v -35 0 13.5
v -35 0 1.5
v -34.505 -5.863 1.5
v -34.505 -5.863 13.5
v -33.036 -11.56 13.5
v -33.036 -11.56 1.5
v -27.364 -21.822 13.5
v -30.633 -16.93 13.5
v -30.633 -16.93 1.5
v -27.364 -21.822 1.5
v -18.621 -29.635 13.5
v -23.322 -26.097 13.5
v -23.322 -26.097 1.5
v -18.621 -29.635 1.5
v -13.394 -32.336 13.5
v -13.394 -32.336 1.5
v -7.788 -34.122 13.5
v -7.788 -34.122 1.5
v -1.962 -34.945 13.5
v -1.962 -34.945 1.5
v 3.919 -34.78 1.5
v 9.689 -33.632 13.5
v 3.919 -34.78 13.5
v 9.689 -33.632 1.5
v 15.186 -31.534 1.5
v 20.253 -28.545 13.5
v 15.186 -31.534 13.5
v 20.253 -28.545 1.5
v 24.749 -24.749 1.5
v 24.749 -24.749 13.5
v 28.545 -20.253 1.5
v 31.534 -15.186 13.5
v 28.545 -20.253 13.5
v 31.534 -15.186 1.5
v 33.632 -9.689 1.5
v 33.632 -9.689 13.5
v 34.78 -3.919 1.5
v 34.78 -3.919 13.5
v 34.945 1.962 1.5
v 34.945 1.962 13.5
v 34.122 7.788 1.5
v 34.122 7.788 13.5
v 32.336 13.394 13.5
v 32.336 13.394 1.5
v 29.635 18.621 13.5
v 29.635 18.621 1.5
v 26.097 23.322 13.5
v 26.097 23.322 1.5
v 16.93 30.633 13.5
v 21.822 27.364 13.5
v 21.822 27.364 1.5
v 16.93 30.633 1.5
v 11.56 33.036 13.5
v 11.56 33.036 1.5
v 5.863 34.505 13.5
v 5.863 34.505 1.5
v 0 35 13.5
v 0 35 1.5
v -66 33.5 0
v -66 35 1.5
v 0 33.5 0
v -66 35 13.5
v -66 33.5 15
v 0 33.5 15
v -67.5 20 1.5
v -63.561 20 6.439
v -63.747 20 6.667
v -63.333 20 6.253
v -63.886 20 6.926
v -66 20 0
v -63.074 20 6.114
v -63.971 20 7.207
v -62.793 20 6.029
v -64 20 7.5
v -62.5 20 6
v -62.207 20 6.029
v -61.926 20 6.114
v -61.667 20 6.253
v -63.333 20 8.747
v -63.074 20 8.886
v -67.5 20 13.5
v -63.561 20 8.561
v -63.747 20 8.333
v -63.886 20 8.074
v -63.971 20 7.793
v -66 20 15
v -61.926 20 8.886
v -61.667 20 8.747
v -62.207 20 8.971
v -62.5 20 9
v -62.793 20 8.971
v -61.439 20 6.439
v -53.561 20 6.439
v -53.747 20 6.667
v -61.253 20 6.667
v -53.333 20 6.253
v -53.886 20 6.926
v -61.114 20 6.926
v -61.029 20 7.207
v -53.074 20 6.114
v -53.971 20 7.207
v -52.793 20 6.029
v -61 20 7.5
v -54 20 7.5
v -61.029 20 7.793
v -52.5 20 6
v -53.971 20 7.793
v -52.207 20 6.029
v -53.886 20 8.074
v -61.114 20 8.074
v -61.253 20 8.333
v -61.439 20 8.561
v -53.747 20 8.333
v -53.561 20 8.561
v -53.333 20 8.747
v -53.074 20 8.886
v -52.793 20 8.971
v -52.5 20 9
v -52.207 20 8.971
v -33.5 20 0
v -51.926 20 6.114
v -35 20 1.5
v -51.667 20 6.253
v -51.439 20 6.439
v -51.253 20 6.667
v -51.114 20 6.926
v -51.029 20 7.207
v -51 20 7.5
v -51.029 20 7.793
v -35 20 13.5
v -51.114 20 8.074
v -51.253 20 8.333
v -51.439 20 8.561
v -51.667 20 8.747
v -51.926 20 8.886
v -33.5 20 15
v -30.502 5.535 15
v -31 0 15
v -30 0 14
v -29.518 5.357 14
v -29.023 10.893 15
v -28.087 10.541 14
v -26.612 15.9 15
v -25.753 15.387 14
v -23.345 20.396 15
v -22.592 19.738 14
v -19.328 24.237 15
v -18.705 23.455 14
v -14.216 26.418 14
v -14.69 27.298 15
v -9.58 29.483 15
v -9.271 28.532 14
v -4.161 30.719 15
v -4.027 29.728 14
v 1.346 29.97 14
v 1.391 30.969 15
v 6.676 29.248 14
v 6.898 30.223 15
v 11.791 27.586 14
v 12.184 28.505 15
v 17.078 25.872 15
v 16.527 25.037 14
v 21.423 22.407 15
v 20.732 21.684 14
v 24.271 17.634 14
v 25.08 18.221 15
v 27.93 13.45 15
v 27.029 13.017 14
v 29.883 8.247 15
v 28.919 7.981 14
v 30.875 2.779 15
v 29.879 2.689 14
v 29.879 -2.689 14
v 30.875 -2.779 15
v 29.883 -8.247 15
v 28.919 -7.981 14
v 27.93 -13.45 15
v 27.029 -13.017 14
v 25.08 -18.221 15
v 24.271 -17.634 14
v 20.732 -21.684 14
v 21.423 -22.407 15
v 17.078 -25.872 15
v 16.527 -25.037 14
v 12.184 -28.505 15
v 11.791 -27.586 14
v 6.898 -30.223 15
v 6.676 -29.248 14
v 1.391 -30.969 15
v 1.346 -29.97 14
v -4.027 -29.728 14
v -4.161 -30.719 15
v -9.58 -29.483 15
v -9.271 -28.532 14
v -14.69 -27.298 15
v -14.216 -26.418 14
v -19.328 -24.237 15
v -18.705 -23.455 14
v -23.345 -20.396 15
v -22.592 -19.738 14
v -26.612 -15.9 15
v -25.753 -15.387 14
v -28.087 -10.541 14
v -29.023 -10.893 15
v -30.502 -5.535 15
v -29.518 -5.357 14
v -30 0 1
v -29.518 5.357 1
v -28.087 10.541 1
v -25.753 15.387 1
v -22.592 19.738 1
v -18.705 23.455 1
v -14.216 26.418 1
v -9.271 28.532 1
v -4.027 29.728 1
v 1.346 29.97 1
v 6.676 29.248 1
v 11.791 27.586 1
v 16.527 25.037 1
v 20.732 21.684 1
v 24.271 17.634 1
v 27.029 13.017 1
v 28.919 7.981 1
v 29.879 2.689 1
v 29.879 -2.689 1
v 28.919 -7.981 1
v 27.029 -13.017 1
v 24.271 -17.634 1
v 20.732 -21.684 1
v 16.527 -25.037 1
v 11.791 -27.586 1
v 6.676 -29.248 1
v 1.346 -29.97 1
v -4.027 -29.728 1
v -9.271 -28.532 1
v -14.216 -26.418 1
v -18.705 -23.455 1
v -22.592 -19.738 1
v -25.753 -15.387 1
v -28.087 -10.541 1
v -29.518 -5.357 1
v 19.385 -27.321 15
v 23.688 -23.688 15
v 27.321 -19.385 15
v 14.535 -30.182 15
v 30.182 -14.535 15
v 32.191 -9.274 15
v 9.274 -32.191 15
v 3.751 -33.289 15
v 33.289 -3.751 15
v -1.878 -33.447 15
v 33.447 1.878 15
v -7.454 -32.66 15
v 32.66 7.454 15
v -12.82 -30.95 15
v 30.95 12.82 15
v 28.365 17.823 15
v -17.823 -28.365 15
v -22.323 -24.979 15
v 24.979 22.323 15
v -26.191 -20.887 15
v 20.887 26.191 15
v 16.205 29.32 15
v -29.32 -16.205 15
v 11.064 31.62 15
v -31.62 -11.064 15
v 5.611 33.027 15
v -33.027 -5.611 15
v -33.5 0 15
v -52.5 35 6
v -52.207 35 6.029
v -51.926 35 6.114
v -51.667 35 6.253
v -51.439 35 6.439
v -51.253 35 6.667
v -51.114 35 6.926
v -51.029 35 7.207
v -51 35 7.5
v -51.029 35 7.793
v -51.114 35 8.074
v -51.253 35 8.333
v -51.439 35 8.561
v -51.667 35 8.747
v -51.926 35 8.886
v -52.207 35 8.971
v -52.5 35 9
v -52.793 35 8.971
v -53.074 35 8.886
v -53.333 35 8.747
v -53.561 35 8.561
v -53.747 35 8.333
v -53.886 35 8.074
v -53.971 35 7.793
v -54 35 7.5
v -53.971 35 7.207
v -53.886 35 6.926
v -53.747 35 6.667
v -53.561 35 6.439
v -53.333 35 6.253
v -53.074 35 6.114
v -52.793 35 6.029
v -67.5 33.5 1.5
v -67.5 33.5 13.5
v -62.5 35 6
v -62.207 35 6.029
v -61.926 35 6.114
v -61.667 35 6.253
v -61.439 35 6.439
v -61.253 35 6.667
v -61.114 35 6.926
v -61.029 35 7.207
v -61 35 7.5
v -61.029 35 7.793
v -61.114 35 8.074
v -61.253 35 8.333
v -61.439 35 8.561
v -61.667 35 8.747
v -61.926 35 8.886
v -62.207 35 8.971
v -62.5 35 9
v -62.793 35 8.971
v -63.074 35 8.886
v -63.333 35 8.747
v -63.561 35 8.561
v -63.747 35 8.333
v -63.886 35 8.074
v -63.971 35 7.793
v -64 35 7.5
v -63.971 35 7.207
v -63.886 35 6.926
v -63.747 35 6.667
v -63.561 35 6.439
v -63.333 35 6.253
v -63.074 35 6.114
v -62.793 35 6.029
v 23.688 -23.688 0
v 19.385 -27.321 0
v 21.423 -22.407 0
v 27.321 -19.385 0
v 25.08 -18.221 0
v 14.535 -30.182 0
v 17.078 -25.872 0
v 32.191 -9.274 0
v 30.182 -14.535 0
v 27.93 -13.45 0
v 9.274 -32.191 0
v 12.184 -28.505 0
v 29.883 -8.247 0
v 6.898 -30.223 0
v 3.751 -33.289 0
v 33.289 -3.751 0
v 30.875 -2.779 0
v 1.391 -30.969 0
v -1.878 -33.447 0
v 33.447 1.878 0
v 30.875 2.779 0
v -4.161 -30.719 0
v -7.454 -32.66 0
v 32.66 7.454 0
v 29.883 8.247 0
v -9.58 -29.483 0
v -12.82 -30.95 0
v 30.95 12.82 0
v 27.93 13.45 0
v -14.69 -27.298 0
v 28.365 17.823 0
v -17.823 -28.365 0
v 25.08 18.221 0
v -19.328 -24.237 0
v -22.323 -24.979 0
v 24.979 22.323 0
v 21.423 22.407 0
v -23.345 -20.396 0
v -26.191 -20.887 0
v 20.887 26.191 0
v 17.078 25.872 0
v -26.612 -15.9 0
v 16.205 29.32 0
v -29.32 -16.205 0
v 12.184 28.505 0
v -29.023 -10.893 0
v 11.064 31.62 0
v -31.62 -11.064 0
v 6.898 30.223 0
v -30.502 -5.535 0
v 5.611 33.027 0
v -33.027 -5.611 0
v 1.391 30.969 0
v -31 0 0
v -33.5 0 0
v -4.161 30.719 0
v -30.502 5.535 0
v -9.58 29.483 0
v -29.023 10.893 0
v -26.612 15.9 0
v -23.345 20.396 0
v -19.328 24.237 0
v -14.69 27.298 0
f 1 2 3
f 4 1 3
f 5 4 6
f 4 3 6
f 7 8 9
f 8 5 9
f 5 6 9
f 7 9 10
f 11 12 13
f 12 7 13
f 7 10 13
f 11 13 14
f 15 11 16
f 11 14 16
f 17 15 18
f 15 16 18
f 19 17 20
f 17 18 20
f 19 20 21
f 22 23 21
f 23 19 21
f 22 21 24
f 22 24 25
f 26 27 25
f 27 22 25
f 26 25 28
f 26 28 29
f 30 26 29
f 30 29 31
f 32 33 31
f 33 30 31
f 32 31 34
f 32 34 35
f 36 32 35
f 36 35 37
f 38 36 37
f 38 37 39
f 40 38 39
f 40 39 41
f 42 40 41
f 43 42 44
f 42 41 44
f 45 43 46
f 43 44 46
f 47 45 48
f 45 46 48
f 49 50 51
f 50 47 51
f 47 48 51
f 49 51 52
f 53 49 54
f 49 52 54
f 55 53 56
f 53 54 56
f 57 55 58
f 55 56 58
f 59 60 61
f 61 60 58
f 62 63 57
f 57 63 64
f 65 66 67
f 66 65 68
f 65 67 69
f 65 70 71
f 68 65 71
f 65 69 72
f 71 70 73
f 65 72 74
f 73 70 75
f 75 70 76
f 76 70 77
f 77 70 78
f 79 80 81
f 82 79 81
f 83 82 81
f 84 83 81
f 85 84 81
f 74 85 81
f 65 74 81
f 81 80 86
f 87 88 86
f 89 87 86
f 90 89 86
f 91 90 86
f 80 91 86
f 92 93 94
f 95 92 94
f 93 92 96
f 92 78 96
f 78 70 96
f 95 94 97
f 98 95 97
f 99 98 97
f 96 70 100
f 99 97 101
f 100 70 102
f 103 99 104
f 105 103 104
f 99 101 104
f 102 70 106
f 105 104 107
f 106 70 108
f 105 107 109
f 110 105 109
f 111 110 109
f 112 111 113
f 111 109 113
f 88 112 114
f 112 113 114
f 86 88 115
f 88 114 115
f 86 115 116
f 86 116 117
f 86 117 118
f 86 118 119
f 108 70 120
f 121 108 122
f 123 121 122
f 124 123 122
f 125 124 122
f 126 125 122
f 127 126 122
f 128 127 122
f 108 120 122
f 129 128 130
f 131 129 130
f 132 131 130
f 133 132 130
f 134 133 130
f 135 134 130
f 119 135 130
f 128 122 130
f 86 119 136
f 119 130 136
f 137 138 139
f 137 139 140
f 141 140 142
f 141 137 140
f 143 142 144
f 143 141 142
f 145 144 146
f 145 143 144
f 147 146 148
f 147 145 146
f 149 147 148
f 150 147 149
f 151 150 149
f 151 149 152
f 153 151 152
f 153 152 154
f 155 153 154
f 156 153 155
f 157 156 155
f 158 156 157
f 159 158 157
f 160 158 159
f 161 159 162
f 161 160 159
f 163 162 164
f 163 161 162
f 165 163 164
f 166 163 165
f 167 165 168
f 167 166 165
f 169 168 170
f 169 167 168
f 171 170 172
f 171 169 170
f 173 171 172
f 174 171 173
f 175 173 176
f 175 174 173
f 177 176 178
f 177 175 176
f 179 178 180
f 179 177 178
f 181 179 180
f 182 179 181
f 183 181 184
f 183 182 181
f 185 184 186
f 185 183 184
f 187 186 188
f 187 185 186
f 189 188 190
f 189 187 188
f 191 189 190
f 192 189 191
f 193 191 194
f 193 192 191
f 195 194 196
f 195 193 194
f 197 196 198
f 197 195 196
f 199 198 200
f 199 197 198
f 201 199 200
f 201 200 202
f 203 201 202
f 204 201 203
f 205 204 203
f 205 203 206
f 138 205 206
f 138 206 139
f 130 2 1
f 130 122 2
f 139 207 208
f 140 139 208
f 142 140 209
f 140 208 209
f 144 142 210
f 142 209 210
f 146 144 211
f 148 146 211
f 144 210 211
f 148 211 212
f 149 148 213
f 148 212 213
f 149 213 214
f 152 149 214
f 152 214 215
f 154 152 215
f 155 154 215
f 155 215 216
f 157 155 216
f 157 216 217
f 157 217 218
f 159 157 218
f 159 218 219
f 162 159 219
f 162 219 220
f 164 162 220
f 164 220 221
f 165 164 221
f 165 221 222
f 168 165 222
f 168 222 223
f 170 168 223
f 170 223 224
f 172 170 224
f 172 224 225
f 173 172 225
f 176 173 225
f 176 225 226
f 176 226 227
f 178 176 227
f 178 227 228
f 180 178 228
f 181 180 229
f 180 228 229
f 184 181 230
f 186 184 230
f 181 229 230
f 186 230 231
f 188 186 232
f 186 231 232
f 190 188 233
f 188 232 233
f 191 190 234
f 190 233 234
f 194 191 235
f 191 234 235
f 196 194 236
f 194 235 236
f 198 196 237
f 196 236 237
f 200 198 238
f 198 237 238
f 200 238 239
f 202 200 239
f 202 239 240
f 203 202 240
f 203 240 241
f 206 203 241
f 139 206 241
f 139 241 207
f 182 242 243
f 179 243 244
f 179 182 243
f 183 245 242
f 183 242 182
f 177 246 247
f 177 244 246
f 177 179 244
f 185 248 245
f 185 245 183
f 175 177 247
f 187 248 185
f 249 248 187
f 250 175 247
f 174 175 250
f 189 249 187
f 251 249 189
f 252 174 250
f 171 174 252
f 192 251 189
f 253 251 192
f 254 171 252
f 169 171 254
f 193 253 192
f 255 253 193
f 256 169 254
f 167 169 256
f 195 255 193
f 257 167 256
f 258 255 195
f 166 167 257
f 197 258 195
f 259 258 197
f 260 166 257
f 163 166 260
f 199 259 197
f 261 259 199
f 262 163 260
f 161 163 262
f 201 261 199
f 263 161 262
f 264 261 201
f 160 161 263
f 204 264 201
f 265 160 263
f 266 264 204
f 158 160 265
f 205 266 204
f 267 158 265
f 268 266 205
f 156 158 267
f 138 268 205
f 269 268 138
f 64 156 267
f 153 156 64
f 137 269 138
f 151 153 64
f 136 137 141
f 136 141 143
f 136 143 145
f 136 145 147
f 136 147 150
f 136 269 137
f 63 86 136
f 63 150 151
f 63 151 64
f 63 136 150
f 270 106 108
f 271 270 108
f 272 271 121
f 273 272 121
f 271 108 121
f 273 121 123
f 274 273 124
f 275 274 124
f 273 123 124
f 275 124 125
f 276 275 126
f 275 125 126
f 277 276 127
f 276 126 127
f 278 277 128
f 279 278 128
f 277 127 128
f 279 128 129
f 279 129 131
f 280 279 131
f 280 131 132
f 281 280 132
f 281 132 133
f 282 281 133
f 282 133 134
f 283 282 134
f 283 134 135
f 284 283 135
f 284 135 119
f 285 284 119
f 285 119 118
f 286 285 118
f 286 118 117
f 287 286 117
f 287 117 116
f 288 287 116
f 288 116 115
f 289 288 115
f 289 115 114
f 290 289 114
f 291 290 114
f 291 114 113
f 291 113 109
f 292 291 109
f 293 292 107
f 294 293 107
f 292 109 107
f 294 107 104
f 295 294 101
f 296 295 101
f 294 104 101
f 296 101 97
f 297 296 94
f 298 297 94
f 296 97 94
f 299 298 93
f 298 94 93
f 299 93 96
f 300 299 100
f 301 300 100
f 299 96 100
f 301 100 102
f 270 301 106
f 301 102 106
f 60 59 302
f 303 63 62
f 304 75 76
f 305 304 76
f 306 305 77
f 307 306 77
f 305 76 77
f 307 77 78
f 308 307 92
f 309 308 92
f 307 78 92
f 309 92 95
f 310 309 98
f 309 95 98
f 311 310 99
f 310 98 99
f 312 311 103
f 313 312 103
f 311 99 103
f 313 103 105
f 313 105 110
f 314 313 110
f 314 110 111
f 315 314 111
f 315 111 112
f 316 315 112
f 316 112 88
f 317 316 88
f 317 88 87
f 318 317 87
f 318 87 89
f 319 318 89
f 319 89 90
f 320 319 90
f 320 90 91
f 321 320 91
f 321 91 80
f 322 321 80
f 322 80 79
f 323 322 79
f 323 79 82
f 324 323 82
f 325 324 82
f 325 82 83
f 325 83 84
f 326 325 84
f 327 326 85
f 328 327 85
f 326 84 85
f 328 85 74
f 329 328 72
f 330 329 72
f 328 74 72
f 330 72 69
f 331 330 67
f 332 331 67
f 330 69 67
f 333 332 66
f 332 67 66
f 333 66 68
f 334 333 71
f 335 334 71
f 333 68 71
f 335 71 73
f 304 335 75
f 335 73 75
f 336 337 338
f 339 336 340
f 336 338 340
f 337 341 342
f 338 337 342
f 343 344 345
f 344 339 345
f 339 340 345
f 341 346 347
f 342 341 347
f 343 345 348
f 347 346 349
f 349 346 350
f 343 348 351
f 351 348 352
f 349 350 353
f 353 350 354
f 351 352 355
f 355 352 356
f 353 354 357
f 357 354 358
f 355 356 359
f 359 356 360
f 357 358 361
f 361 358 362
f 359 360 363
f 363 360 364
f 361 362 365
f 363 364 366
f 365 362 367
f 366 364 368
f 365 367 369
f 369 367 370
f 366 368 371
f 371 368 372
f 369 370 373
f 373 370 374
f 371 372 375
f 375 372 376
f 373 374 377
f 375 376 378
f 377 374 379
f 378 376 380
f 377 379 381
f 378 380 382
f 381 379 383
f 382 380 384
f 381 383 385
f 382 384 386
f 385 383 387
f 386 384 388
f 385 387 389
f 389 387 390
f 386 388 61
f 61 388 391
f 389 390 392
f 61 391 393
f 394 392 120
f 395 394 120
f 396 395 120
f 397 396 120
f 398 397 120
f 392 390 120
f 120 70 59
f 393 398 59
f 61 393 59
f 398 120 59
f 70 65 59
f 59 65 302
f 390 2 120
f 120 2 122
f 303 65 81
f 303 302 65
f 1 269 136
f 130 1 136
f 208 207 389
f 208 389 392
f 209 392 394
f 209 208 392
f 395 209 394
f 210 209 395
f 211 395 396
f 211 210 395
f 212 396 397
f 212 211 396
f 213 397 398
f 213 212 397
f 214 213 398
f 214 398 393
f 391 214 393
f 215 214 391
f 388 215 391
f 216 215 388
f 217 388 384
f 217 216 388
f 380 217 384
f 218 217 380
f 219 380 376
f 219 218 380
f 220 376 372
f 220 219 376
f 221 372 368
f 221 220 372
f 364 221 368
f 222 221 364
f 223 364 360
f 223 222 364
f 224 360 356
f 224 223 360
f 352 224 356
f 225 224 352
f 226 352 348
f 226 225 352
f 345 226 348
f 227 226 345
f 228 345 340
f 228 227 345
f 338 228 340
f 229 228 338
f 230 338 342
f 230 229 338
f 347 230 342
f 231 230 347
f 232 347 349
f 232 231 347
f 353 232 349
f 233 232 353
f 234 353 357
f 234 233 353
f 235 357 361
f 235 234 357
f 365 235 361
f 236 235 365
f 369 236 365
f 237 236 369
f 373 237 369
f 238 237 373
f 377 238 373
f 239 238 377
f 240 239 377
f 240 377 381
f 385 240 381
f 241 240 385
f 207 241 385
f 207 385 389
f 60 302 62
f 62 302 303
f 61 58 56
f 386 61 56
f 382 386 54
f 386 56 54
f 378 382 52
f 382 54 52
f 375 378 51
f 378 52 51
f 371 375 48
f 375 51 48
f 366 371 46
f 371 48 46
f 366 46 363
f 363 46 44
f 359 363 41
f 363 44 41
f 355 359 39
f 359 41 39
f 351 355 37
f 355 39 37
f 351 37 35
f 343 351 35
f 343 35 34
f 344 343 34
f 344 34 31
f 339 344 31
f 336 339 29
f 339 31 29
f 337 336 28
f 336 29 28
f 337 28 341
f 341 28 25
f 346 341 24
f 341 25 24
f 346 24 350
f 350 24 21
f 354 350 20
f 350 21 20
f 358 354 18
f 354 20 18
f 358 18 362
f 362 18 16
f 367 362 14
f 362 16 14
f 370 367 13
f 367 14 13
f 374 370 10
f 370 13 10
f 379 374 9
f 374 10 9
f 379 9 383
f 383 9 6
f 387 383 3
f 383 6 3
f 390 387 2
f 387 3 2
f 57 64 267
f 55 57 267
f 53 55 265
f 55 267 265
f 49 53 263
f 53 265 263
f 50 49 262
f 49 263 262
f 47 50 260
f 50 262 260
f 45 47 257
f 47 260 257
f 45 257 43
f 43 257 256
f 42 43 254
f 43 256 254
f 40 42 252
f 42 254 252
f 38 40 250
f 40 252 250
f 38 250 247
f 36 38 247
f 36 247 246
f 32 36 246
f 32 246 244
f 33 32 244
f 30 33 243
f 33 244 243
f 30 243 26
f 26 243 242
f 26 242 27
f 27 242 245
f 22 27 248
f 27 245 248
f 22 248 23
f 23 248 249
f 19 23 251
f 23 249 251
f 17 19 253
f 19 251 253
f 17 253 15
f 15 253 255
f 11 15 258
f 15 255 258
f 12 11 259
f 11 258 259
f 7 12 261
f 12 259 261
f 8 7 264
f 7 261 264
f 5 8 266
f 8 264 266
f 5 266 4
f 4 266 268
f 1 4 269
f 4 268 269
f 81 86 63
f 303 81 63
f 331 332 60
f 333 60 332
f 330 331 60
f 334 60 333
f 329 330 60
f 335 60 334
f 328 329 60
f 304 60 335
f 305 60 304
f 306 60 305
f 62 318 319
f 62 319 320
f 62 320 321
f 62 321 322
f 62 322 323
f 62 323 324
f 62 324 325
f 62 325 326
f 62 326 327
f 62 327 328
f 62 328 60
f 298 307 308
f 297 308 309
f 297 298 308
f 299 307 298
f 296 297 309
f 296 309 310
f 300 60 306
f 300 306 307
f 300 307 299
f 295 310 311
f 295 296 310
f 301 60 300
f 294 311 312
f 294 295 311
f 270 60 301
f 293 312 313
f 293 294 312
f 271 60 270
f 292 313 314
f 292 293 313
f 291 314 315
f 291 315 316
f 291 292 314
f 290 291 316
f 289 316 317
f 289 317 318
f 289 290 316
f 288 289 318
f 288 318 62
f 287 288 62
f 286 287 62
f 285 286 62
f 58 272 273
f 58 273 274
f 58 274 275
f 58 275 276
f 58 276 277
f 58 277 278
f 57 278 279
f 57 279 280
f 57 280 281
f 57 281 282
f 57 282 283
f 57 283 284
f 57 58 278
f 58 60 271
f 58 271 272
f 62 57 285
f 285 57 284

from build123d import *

# Parameters (mm, degrees)
SKETCH_1_R           = 35
EXTRUDE_1_DEPTH      = 15
SKETCH_2_R           = 30
CUT_EXTRUDE_1_DEPTH  = 52.720402164
EXTRUDE_2_REACH      = 81.687
EXTRUDE_2_END_RADIUS = 35
SKETCH_3_W           = 15
SKETCH_3_H           = 15
SKETCH_4_W           = 15
SKETCH_4_H           = 15
EXTRUDE_3_DEPTH      = 32.5
EXTRUDE_4_REACH      = 81.687
SKETCH_6_W           = 15
SKETCH_6_H           = 20
SKETCH_7_R           = 1.5
CUT_EXTRUDE_2_DEPTH  = 89.352985235
CHAMFER_1_SIZE       = 1
CHAMFER_2_SIZE       = 1.5


with BuildPart() as part:
    # 草图1 → 凸台-拉伸1 (new body)
    with BuildSketch(Plane.XY):
        Circle(SKETCH_1_R)
    extrude(amount=EXTRUDE_1_DEPTH)

    # 草图2 → 切除-拉伸1 (cut, through all)
    with BuildSketch(Plane(origin=(0, 0, 0), x_dir=(-1, 0, 0), z_dir=(0, 0, -1))):
        Circle(SKETCH_2_R)
    extrude(amount=-CUT_EXTRUDE_1_DEPTH, mode=Mode.SUBTRACT)

    # 凸台-拉伸2: up to this cylinder (the profile starts outside it)
    extrude_2_end = Plane(origin=(0, 0, 7.5), z_dir=(0, 0, -1)) * Cylinder(EXTRUDE_2_END_RADIUS, 234.374, mode=Mode.PRIVATE)
    # 草图3 → 凸台-拉伸2 (add, up to the surface)
    with BuildSketch(Plane.ZY.offset(35), mode=Mode.PRIVATE) as extrude_2_sk1:
        with Locations((7.5, 27.5)):
            Rectangle(SKETCH_3_W, SKETCH_3_H)
    extrude_2_tool1 = extrude(extrude_2_sk1.sketch, amount=-EXTRUDE_2_REACH, mode=Mode.PRIVATE) - extrude_2_end
    add(extrude_2_tool1.solids().sort_by_distance((-35, 27.5, 7.5))[0])

    # 草图4 → 凸台-拉伸3 (add)
    with BuildSketch(Plane.ZY.offset(35)):
        with Locations((7.5, 27.5)):
            Rectangle(SKETCH_4_W, SKETCH_4_H)
    extrude(amount=EXTRUDE_3_DEPTH)

    # 草图6 → 凸台-拉伸4 (add, up to next)
    with BuildSketch(Plane.ZY.offset(35), mode=Mode.PRIVATE) as extrude_4_sk1:
        with Locations((7.5, 10)):
            Rectangle(SKETCH_6_W, SKETCH_6_H)
    extrude_4_tool1 = extrude(extrude_4_sk1.sketch, amount=-EXTRUDE_4_REACH, mode=Mode.PRIVATE) - part.part
    add(extrude_4_tool1.solids().sort_by_distance((-35, 10, 7.5))[0])

    # 草图7 → 切除-拉伸2 (cut, through all)
    with BuildSketch(Plane.XZ.offset(-20)):
        with Locations(Location((-62.5, 7.5, 0), (0, 0, 270))):
            Circle(SKETCH_7_R)
        with Locations(Location((-52.5, 7.5, 0), (0, 0, 270))):
            Circle(SKETCH_7_R)
    extrude(amount=-CUT_EXTRUDE_2_DEPTH, mode=Mode.SUBTRACT)

    # 倒角1
    chamfer_1_edges = [part.edges().sort_by_distance(p)[0] for p in [
        (30, 0, 15),
        (30, 0, 0),
    ]]
    chamfer(chamfer_1_edges, length=CHAMFER_1_SIZE)

    # 倒角2
    chamfer_2_edges = [part.edges().sort_by_distance(p)[0] for p in [
        (-33.75, 35, 15),
        (-33.75, 35, 0),
        (-67.5, 27.5, 0),
        (-67.5, 27.5, 15),
        (-67.5, 35, 7.5),
        (24.748737342, -24.748737342, 0),
        (24.748737342, -24.748737342, 15),
        (-35, 10, 0),
        (-35, 10, 15),
    ]]
    chamfer(chamfer_2_edges, length=CHAMFER_2_SIZE)


solid = part.part
